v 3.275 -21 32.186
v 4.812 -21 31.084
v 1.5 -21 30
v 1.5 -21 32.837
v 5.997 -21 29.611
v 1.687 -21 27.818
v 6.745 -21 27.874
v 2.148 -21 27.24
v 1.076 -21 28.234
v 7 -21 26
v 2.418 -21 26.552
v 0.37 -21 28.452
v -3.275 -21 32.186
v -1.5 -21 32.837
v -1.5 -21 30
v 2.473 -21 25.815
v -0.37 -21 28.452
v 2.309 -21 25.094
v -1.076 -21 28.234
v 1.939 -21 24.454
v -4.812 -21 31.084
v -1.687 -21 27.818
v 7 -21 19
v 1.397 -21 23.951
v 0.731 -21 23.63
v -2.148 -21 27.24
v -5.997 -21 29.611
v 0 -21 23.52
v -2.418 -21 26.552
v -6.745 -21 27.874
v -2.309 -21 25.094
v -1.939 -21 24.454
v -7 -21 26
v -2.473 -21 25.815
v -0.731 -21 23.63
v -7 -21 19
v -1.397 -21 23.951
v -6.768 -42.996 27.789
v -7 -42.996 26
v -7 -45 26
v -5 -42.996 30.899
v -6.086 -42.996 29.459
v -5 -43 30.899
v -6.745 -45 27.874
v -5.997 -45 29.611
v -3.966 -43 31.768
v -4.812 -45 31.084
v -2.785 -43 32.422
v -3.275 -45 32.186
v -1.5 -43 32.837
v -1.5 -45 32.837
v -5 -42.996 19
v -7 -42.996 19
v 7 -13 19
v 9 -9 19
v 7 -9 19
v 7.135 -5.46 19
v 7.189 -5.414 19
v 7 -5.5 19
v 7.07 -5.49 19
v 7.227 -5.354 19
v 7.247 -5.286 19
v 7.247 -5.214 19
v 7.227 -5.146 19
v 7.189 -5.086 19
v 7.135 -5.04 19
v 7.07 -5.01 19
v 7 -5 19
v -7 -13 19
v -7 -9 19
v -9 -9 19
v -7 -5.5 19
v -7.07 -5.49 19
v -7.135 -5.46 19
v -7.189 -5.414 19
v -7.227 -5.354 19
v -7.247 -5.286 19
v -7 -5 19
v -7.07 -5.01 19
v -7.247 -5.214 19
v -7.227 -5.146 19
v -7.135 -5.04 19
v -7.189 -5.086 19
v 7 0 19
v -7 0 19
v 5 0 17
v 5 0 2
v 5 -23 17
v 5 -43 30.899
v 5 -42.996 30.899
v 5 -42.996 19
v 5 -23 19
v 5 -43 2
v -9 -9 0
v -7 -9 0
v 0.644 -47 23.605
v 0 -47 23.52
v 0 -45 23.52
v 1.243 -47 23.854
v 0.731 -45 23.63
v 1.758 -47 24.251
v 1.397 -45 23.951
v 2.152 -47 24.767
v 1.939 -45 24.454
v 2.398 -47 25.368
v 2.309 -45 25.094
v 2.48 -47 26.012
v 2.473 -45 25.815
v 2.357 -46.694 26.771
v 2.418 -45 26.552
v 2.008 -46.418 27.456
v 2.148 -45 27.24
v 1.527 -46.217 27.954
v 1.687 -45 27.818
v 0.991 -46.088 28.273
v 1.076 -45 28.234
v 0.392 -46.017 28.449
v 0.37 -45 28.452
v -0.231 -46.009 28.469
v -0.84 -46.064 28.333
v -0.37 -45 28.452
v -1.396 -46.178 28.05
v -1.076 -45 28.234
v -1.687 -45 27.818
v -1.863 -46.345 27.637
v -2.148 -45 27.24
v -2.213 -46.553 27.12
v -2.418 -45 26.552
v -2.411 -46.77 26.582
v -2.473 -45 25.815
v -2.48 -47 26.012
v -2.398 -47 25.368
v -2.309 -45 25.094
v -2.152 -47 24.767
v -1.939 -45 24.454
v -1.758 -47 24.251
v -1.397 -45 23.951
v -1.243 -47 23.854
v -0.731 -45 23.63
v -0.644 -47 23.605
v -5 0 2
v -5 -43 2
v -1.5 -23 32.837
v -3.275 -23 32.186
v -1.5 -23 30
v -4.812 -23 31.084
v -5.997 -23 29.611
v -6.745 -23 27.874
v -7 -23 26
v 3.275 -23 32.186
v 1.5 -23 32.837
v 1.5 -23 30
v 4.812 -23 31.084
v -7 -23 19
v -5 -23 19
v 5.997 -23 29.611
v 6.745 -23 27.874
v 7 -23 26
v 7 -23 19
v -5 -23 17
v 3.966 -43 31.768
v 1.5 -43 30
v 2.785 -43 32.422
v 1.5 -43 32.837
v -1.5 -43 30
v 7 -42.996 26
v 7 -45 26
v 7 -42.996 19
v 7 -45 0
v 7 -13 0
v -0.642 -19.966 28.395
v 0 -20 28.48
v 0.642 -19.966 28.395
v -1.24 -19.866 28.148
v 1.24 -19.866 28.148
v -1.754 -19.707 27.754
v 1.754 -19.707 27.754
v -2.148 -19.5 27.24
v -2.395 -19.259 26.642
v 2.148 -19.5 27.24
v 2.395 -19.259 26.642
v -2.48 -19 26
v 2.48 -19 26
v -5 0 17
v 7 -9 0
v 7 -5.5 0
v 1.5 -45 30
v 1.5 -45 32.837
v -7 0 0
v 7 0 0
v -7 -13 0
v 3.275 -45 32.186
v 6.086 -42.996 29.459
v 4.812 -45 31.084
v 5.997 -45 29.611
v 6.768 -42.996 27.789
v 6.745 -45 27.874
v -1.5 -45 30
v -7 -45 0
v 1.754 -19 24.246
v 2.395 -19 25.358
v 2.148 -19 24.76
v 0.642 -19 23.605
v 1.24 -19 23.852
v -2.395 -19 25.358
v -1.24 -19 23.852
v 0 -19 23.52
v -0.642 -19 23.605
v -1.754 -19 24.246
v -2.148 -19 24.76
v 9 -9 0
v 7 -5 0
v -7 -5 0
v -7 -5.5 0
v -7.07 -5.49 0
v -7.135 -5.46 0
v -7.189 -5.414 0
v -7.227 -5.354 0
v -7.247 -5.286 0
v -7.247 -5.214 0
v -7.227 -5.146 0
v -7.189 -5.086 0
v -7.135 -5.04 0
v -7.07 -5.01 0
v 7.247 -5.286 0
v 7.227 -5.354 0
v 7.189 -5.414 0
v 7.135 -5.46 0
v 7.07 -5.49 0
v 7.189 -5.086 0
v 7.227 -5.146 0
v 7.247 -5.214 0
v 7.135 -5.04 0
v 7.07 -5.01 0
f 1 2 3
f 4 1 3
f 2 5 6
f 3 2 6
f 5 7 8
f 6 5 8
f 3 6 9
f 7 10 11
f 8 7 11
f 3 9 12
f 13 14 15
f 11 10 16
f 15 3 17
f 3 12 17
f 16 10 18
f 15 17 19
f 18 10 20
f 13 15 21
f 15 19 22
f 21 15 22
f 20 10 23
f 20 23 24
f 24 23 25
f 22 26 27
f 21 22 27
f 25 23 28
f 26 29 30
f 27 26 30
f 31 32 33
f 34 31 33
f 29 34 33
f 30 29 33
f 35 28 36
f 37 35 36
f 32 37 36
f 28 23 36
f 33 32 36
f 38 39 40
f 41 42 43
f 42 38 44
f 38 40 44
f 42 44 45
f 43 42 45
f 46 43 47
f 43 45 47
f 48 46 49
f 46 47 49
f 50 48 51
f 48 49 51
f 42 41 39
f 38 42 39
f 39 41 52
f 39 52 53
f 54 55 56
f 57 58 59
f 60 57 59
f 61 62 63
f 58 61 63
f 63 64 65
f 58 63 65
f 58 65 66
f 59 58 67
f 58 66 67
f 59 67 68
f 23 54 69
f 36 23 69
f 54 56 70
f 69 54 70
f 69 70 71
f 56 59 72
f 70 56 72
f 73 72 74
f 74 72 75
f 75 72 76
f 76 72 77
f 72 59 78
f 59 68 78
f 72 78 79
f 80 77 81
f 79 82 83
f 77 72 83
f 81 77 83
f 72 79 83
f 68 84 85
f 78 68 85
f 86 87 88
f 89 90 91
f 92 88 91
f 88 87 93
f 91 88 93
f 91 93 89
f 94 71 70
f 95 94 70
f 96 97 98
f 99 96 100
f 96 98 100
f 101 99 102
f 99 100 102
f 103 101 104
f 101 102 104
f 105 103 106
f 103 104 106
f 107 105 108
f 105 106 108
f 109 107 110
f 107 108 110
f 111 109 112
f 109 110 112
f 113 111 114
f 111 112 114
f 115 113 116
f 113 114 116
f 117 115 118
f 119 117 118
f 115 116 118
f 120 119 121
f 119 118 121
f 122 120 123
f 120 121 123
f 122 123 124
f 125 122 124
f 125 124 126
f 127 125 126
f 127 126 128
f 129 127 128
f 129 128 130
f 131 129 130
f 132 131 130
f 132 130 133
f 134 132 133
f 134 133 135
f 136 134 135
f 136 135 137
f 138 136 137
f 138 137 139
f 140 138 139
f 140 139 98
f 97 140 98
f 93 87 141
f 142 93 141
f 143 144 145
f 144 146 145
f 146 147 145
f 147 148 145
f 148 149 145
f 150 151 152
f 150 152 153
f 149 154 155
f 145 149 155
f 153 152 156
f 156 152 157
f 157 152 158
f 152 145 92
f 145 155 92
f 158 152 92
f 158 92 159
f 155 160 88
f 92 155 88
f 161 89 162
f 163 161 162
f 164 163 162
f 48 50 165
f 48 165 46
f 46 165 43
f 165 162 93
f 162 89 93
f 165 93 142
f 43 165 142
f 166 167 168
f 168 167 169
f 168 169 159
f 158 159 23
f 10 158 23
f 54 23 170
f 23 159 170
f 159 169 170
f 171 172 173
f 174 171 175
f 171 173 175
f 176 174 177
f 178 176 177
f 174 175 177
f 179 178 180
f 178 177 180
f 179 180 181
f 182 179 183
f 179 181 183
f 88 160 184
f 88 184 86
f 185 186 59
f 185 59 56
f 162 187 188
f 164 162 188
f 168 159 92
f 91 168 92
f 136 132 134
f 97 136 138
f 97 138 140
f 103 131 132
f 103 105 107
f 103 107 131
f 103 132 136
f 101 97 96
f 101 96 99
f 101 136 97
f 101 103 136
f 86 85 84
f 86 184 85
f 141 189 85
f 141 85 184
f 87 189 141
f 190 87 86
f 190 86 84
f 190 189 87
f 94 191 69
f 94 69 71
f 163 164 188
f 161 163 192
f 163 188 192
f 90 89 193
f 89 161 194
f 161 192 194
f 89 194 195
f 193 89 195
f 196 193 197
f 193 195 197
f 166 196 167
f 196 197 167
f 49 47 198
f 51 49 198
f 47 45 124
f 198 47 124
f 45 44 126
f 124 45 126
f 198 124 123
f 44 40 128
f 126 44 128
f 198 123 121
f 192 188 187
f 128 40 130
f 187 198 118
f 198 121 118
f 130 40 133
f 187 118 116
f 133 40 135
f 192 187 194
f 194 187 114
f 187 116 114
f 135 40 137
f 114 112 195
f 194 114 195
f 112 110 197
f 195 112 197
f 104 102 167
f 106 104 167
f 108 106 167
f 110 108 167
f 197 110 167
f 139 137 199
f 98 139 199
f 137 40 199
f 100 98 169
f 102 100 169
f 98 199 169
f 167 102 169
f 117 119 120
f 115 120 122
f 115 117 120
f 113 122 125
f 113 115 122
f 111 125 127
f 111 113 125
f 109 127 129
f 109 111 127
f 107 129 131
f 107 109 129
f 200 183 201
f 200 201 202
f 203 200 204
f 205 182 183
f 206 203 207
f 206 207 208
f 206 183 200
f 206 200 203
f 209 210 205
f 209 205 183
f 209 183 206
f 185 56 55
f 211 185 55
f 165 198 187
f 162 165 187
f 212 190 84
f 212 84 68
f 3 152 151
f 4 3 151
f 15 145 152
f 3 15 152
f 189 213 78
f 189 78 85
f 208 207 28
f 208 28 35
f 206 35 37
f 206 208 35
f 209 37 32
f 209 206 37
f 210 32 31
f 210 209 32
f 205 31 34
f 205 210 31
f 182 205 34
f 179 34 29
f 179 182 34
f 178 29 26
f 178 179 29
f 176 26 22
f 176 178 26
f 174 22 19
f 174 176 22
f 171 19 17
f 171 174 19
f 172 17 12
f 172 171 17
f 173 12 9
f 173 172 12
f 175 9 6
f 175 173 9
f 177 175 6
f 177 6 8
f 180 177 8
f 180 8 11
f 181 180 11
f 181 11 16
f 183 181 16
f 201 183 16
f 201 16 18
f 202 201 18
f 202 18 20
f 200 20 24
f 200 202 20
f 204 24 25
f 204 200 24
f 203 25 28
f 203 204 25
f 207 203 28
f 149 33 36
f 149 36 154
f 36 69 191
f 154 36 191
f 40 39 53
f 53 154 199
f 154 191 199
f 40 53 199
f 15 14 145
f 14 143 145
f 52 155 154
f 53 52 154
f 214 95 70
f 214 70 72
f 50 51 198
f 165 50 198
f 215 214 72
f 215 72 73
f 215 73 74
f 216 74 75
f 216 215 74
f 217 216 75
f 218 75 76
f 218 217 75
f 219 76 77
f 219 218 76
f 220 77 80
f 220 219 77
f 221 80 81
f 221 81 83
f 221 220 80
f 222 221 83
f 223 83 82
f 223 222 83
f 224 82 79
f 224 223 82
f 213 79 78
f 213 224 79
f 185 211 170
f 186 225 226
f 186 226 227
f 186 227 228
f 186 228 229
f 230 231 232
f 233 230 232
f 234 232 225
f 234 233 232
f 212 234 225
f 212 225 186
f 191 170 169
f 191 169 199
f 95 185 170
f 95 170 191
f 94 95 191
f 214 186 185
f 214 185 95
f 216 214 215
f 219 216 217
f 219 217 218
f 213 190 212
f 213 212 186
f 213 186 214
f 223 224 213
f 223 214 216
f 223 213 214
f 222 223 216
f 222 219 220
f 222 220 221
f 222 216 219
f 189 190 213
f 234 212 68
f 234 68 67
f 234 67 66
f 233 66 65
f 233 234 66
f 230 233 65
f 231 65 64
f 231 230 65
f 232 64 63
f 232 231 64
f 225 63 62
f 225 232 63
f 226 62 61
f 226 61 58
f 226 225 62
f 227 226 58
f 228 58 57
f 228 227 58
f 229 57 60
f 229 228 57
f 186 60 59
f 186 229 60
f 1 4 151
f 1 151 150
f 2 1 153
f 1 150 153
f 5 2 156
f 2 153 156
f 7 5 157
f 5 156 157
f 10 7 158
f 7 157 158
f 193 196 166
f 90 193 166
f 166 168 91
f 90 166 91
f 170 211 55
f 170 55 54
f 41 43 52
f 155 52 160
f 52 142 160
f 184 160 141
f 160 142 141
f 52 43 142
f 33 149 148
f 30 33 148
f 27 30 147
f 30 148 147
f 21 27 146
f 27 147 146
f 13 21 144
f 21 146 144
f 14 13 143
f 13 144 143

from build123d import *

# Parameters (mm, degrees)
EXTRUDE_1_DEPTH     = 19
CUT_EXTRUDE_2_DEPTH = 43
CUT_EXTRUDE_3_DEPTH = 2
EXTRUDE_2_DEPTH     = 14
SKETCH_5_R          = 2.48
EXTRUDE_3_DEPTH     = 2
CUT_EXTRUDE_4_DEPTH = 50
EXTRUDE_START       = 2
SKETCH_7_R          = 2.48
EXTRUDE_4_DEPTH     = 2
SKETCH_8_W          = 1.371307674
SKETCH_8_H          = 2.48
EXTRUDE_5_DEPTH     = 2
CUT_EXTRUDE_5_DEPTH = 10
CUT_EXTRUDE_6_DEPTH = 2
SKETCH_11_W         = 2.08463024
SKETCH_11_H         = 2.48
EXTRUDE_7_DEPTH     = 2
CUT_EXTRUDE_7_DEPTH = 20
CUT_EXTRUDE_8_DEPTH = 2.5
CUT_EXTRUDE_9_DEPTH = 50


with BuildPart() as part:
    # 草图1 → 凸台-拉伸1 (new body)
    with BuildSketch(Plane.XY):
        with BuildLine():
            Line((0, 0), (7, 0))
            Line((7, 0), (7, -5))
            ThreePointArc((7, -5), (7.25, -5.25), (7, -5.5))
            Line((7, -5.5), (7, -9))
            Line((7, -9), (9, -9))
            Line((9, -9), (7, -13))
            Line((7, -13), (7, -45))
            Line((7, -45), (0, -45))
            Line((0, -45), (-7, -45))
            Line((-7, -45), (-7, -13))
            Line((-7, -13), (-9, -9))
            Line((-9, -9), (-7, -9))
            Line((-7, -9), (-7, -5.5))
            ThreePointArc((-7, -5.5), (-7.25, -5.25), (-7, -5))
            Line((-7, -5), (-7, 0))
            Line((-7, 0), (0, 0))
        make_face()
    extrude(amount=EXTRUDE_1_DEPTH)

    # 草图2 → 切除-拉伸2 (cut)
    with BuildSketch(Plane(origin=(0, 0, 0), x_dir=(1, 0, 0), z_dir=(0, 1, 0))):
        Polygon((0, -2), (5, -2), (5, -9.5), (5, -17), (0, -17), (-5, -17), (-5, -9.5), (-5, -2), align=None)
    extrude(amount=-CUT_EXTRUDE_2_DEPTH, mode=Mode.SUBTRACT)

    # 草图3 → 切除-拉伸3 (cut)
    with BuildSketch(Plane.XY.offset(19)):
        Polygon((0, -23), (5, -23), (5, -43), (0, -43), (-5, -43), (-5, -23), align=None)
    extrude(amount=-CUT_EXTRUDE_3_DEPTH, mode=Mode.SUBTRACT)

    # 草图4 → 凸台-拉伸2 (add)
    with BuildSketch(Plane.XY.offset(19)):
        Polygon((-7, -42.996240591), (-7, -45), (7, -45), (7, -42.996240591), (5, -42.996240591), (5, -43), (-5, -43), (-5, -42.996240591), align=None)
        Polygon((-7, -23), (5, -23), (7, -23), (7, -21), (-7, -21), align=None)
    extrude(amount=EXTRUDE_2_DEPTH)

    # 草图5 → 凸台-拉伸3 (add)
    with BuildSketch(Plane.XZ.offset(45)):
        with Locations(Location((0, 26, 0), (0, 0, 270))):
            Circle(SKETCH_5_R)
    extrude(amount=EXTRUDE_3_DEPTH)

    # 草图6 → 切除-拉伸4 (cut)
    with BuildSketch(Plane(origin=(0, -45, 0), x_dir=(-1, 0, 0), z_dir=(0, -1, 0))):
        with BuildLine():
            Line((7, -33), (7, -26))
            ThreePointArc((7, -26), (4.949747468, -30.949747468), (0, -33))
            Line((0, -33), (7, -33))
        make_face()
        with BuildLine():
            Line((-7, -33), (0, -33))
            ThreePointArc((0, -33), (-4.949747468, -30.949747468), (-7, -26))
            Line((-7, -26), (-7, -33))
        make_face()
    extrude(amount=-CUT_EXTRUDE_4_DEPTH, mode=Mode.SUBTRACT)

    # 草图7 → 凸台-拉伸4 (add)
    with BuildSketch(Plane(origin=(0, -21, 0), x_dir=(1, 0, 0), z_dir=(0, 1, 0)).offset(EXTRUDE_START)):
        with Locations(Location((0, -26, 0), (0, 0, 90))):
            Circle(SKETCH_7_R)
    extrude(amount=-EXTRUDE_4_DEPTH)

    # 草图8 → 凸台-拉伸5 (add)
    with BuildSketch(Plane(origin=(0, -21, 0), x_dir=(1, 0, 0), z_dir=(0, 1, 0))):
        with Locations((4.228560023, -27.24)):
            Rectangle(SKETCH_8_W, SKETCH_8_H)
    extrude(amount=EXTRUDE_5_DEPTH)

    # 草图9 → 切除-拉伸5 (cut)
    with BuildSketch(Plane(origin=(4.91421386, 0, 0), x_dir=(0, 0, -1), z_dir=(1, 0, 0))):
        Polygon((-26, -19), (-28.48, -19), (-28.48, -20), align=None)
    extrude(amount=-CUT_EXTRUDE_5_DEPTH, mode=Mode.SUBTRACT)

    # 草图10 → 切除-拉伸6 (cut)
    with BuildSketch(Plane(origin=(4.91421386, 0, 0), x_dir=(0, 0, -1), z_dir=(1, 0, 0))):
        Polygon((-26, -19), (-26, -21), (-28.48, -21), (-28.48, -20), align=None)
    extrude(amount=-CUT_EXTRUDE_6_DEPTH, mode=Mode.SUBTRACT)

    # 草图11 → 凸台-拉伸7 (add)
    with BuildSketch(Plane(origin=(0, -47, 0), x_dir=(-1, 0, 0), z_dir=(0, -1, 0))):
        with Locations((-4.196152556, -27.25184449)):
            Rectangle(SKETCH_11_W, SKETCH_11_H)
    extrude(amount=-EXTRUDE_7_DEPTH)

    # 草图12 → 切除-拉伸7 (cut)
    with BuildSketch(Plane(origin=(5.238467676, 0, 0), x_dir=(0, 0, -1), z_dir=(1, 0, 0))):
        Polygon((-28.49184449, -47), (-28.49184449, -46), (-26.01184449, -47), align=None)
    extrude(amount=-CUT_EXTRUDE_7_DEPTH, mode=Mode.SUBTRACT)

    # 草图13 → 切除-拉伸8 (cut)
    with BuildSketch(Plane(origin=(5.238467676, 0, 0), x_dir=(0, 0, -1), z_dir=(1, 0, 0))):
        Polygon((-28.49184449, -46), (-26.01184449, -47), (-26, -45), (-28.49184449, -45), align=None)
    extrude(amount=-CUT_EXTRUDE_8_DEPTH, mode=Mode.SUBTRACT)

    # 草图14 → 切除-拉伸9 (cut)
    with BuildSketch(Plane.XZ.offset(45)):
        with BuildLine():
            ThreePointArc((1.5, 32.837397166), (0.754393744, 32.959230567), (0, 33))
            Line((0, 33), (0, 30))
            Line((0, 30), (1.5, 30))
            Line((1.5, 30), (1.5, 32.837397166))
        make_face()
        with BuildLine():
            Line((0, 30), (0, 33))
            ThreePointArc((0, 33), (-0.754393744, 32.959230567), (-1.5, 32.837397166))
            Line((-1.5, 32.837397166), (-1.5, 30))
            Line((-1.5, 30), (0, 30))
        make_face()
        with BuildLine():
            ThreePointArc((-1.5, 32.837397166), (-0.754393744, 32.959230567), (0, 33))
            ThreePointArc((0, 33), (0.754393744, 32.959230567), (1.5, 32.837397166))
            Line((1.5, 32.837397166), (1.5, 33.175350271))
            Line((1.5, 33.175350271), (-1.5, 33.175350271))
            Line((-1.5, 33.175350271), (-1.5, 32.837397166))
        make_face()
    extrude(amount=-CUT_EXTRUDE_9_DEPTH, mode=Mode.SUBTRACT)


solid = part.part
